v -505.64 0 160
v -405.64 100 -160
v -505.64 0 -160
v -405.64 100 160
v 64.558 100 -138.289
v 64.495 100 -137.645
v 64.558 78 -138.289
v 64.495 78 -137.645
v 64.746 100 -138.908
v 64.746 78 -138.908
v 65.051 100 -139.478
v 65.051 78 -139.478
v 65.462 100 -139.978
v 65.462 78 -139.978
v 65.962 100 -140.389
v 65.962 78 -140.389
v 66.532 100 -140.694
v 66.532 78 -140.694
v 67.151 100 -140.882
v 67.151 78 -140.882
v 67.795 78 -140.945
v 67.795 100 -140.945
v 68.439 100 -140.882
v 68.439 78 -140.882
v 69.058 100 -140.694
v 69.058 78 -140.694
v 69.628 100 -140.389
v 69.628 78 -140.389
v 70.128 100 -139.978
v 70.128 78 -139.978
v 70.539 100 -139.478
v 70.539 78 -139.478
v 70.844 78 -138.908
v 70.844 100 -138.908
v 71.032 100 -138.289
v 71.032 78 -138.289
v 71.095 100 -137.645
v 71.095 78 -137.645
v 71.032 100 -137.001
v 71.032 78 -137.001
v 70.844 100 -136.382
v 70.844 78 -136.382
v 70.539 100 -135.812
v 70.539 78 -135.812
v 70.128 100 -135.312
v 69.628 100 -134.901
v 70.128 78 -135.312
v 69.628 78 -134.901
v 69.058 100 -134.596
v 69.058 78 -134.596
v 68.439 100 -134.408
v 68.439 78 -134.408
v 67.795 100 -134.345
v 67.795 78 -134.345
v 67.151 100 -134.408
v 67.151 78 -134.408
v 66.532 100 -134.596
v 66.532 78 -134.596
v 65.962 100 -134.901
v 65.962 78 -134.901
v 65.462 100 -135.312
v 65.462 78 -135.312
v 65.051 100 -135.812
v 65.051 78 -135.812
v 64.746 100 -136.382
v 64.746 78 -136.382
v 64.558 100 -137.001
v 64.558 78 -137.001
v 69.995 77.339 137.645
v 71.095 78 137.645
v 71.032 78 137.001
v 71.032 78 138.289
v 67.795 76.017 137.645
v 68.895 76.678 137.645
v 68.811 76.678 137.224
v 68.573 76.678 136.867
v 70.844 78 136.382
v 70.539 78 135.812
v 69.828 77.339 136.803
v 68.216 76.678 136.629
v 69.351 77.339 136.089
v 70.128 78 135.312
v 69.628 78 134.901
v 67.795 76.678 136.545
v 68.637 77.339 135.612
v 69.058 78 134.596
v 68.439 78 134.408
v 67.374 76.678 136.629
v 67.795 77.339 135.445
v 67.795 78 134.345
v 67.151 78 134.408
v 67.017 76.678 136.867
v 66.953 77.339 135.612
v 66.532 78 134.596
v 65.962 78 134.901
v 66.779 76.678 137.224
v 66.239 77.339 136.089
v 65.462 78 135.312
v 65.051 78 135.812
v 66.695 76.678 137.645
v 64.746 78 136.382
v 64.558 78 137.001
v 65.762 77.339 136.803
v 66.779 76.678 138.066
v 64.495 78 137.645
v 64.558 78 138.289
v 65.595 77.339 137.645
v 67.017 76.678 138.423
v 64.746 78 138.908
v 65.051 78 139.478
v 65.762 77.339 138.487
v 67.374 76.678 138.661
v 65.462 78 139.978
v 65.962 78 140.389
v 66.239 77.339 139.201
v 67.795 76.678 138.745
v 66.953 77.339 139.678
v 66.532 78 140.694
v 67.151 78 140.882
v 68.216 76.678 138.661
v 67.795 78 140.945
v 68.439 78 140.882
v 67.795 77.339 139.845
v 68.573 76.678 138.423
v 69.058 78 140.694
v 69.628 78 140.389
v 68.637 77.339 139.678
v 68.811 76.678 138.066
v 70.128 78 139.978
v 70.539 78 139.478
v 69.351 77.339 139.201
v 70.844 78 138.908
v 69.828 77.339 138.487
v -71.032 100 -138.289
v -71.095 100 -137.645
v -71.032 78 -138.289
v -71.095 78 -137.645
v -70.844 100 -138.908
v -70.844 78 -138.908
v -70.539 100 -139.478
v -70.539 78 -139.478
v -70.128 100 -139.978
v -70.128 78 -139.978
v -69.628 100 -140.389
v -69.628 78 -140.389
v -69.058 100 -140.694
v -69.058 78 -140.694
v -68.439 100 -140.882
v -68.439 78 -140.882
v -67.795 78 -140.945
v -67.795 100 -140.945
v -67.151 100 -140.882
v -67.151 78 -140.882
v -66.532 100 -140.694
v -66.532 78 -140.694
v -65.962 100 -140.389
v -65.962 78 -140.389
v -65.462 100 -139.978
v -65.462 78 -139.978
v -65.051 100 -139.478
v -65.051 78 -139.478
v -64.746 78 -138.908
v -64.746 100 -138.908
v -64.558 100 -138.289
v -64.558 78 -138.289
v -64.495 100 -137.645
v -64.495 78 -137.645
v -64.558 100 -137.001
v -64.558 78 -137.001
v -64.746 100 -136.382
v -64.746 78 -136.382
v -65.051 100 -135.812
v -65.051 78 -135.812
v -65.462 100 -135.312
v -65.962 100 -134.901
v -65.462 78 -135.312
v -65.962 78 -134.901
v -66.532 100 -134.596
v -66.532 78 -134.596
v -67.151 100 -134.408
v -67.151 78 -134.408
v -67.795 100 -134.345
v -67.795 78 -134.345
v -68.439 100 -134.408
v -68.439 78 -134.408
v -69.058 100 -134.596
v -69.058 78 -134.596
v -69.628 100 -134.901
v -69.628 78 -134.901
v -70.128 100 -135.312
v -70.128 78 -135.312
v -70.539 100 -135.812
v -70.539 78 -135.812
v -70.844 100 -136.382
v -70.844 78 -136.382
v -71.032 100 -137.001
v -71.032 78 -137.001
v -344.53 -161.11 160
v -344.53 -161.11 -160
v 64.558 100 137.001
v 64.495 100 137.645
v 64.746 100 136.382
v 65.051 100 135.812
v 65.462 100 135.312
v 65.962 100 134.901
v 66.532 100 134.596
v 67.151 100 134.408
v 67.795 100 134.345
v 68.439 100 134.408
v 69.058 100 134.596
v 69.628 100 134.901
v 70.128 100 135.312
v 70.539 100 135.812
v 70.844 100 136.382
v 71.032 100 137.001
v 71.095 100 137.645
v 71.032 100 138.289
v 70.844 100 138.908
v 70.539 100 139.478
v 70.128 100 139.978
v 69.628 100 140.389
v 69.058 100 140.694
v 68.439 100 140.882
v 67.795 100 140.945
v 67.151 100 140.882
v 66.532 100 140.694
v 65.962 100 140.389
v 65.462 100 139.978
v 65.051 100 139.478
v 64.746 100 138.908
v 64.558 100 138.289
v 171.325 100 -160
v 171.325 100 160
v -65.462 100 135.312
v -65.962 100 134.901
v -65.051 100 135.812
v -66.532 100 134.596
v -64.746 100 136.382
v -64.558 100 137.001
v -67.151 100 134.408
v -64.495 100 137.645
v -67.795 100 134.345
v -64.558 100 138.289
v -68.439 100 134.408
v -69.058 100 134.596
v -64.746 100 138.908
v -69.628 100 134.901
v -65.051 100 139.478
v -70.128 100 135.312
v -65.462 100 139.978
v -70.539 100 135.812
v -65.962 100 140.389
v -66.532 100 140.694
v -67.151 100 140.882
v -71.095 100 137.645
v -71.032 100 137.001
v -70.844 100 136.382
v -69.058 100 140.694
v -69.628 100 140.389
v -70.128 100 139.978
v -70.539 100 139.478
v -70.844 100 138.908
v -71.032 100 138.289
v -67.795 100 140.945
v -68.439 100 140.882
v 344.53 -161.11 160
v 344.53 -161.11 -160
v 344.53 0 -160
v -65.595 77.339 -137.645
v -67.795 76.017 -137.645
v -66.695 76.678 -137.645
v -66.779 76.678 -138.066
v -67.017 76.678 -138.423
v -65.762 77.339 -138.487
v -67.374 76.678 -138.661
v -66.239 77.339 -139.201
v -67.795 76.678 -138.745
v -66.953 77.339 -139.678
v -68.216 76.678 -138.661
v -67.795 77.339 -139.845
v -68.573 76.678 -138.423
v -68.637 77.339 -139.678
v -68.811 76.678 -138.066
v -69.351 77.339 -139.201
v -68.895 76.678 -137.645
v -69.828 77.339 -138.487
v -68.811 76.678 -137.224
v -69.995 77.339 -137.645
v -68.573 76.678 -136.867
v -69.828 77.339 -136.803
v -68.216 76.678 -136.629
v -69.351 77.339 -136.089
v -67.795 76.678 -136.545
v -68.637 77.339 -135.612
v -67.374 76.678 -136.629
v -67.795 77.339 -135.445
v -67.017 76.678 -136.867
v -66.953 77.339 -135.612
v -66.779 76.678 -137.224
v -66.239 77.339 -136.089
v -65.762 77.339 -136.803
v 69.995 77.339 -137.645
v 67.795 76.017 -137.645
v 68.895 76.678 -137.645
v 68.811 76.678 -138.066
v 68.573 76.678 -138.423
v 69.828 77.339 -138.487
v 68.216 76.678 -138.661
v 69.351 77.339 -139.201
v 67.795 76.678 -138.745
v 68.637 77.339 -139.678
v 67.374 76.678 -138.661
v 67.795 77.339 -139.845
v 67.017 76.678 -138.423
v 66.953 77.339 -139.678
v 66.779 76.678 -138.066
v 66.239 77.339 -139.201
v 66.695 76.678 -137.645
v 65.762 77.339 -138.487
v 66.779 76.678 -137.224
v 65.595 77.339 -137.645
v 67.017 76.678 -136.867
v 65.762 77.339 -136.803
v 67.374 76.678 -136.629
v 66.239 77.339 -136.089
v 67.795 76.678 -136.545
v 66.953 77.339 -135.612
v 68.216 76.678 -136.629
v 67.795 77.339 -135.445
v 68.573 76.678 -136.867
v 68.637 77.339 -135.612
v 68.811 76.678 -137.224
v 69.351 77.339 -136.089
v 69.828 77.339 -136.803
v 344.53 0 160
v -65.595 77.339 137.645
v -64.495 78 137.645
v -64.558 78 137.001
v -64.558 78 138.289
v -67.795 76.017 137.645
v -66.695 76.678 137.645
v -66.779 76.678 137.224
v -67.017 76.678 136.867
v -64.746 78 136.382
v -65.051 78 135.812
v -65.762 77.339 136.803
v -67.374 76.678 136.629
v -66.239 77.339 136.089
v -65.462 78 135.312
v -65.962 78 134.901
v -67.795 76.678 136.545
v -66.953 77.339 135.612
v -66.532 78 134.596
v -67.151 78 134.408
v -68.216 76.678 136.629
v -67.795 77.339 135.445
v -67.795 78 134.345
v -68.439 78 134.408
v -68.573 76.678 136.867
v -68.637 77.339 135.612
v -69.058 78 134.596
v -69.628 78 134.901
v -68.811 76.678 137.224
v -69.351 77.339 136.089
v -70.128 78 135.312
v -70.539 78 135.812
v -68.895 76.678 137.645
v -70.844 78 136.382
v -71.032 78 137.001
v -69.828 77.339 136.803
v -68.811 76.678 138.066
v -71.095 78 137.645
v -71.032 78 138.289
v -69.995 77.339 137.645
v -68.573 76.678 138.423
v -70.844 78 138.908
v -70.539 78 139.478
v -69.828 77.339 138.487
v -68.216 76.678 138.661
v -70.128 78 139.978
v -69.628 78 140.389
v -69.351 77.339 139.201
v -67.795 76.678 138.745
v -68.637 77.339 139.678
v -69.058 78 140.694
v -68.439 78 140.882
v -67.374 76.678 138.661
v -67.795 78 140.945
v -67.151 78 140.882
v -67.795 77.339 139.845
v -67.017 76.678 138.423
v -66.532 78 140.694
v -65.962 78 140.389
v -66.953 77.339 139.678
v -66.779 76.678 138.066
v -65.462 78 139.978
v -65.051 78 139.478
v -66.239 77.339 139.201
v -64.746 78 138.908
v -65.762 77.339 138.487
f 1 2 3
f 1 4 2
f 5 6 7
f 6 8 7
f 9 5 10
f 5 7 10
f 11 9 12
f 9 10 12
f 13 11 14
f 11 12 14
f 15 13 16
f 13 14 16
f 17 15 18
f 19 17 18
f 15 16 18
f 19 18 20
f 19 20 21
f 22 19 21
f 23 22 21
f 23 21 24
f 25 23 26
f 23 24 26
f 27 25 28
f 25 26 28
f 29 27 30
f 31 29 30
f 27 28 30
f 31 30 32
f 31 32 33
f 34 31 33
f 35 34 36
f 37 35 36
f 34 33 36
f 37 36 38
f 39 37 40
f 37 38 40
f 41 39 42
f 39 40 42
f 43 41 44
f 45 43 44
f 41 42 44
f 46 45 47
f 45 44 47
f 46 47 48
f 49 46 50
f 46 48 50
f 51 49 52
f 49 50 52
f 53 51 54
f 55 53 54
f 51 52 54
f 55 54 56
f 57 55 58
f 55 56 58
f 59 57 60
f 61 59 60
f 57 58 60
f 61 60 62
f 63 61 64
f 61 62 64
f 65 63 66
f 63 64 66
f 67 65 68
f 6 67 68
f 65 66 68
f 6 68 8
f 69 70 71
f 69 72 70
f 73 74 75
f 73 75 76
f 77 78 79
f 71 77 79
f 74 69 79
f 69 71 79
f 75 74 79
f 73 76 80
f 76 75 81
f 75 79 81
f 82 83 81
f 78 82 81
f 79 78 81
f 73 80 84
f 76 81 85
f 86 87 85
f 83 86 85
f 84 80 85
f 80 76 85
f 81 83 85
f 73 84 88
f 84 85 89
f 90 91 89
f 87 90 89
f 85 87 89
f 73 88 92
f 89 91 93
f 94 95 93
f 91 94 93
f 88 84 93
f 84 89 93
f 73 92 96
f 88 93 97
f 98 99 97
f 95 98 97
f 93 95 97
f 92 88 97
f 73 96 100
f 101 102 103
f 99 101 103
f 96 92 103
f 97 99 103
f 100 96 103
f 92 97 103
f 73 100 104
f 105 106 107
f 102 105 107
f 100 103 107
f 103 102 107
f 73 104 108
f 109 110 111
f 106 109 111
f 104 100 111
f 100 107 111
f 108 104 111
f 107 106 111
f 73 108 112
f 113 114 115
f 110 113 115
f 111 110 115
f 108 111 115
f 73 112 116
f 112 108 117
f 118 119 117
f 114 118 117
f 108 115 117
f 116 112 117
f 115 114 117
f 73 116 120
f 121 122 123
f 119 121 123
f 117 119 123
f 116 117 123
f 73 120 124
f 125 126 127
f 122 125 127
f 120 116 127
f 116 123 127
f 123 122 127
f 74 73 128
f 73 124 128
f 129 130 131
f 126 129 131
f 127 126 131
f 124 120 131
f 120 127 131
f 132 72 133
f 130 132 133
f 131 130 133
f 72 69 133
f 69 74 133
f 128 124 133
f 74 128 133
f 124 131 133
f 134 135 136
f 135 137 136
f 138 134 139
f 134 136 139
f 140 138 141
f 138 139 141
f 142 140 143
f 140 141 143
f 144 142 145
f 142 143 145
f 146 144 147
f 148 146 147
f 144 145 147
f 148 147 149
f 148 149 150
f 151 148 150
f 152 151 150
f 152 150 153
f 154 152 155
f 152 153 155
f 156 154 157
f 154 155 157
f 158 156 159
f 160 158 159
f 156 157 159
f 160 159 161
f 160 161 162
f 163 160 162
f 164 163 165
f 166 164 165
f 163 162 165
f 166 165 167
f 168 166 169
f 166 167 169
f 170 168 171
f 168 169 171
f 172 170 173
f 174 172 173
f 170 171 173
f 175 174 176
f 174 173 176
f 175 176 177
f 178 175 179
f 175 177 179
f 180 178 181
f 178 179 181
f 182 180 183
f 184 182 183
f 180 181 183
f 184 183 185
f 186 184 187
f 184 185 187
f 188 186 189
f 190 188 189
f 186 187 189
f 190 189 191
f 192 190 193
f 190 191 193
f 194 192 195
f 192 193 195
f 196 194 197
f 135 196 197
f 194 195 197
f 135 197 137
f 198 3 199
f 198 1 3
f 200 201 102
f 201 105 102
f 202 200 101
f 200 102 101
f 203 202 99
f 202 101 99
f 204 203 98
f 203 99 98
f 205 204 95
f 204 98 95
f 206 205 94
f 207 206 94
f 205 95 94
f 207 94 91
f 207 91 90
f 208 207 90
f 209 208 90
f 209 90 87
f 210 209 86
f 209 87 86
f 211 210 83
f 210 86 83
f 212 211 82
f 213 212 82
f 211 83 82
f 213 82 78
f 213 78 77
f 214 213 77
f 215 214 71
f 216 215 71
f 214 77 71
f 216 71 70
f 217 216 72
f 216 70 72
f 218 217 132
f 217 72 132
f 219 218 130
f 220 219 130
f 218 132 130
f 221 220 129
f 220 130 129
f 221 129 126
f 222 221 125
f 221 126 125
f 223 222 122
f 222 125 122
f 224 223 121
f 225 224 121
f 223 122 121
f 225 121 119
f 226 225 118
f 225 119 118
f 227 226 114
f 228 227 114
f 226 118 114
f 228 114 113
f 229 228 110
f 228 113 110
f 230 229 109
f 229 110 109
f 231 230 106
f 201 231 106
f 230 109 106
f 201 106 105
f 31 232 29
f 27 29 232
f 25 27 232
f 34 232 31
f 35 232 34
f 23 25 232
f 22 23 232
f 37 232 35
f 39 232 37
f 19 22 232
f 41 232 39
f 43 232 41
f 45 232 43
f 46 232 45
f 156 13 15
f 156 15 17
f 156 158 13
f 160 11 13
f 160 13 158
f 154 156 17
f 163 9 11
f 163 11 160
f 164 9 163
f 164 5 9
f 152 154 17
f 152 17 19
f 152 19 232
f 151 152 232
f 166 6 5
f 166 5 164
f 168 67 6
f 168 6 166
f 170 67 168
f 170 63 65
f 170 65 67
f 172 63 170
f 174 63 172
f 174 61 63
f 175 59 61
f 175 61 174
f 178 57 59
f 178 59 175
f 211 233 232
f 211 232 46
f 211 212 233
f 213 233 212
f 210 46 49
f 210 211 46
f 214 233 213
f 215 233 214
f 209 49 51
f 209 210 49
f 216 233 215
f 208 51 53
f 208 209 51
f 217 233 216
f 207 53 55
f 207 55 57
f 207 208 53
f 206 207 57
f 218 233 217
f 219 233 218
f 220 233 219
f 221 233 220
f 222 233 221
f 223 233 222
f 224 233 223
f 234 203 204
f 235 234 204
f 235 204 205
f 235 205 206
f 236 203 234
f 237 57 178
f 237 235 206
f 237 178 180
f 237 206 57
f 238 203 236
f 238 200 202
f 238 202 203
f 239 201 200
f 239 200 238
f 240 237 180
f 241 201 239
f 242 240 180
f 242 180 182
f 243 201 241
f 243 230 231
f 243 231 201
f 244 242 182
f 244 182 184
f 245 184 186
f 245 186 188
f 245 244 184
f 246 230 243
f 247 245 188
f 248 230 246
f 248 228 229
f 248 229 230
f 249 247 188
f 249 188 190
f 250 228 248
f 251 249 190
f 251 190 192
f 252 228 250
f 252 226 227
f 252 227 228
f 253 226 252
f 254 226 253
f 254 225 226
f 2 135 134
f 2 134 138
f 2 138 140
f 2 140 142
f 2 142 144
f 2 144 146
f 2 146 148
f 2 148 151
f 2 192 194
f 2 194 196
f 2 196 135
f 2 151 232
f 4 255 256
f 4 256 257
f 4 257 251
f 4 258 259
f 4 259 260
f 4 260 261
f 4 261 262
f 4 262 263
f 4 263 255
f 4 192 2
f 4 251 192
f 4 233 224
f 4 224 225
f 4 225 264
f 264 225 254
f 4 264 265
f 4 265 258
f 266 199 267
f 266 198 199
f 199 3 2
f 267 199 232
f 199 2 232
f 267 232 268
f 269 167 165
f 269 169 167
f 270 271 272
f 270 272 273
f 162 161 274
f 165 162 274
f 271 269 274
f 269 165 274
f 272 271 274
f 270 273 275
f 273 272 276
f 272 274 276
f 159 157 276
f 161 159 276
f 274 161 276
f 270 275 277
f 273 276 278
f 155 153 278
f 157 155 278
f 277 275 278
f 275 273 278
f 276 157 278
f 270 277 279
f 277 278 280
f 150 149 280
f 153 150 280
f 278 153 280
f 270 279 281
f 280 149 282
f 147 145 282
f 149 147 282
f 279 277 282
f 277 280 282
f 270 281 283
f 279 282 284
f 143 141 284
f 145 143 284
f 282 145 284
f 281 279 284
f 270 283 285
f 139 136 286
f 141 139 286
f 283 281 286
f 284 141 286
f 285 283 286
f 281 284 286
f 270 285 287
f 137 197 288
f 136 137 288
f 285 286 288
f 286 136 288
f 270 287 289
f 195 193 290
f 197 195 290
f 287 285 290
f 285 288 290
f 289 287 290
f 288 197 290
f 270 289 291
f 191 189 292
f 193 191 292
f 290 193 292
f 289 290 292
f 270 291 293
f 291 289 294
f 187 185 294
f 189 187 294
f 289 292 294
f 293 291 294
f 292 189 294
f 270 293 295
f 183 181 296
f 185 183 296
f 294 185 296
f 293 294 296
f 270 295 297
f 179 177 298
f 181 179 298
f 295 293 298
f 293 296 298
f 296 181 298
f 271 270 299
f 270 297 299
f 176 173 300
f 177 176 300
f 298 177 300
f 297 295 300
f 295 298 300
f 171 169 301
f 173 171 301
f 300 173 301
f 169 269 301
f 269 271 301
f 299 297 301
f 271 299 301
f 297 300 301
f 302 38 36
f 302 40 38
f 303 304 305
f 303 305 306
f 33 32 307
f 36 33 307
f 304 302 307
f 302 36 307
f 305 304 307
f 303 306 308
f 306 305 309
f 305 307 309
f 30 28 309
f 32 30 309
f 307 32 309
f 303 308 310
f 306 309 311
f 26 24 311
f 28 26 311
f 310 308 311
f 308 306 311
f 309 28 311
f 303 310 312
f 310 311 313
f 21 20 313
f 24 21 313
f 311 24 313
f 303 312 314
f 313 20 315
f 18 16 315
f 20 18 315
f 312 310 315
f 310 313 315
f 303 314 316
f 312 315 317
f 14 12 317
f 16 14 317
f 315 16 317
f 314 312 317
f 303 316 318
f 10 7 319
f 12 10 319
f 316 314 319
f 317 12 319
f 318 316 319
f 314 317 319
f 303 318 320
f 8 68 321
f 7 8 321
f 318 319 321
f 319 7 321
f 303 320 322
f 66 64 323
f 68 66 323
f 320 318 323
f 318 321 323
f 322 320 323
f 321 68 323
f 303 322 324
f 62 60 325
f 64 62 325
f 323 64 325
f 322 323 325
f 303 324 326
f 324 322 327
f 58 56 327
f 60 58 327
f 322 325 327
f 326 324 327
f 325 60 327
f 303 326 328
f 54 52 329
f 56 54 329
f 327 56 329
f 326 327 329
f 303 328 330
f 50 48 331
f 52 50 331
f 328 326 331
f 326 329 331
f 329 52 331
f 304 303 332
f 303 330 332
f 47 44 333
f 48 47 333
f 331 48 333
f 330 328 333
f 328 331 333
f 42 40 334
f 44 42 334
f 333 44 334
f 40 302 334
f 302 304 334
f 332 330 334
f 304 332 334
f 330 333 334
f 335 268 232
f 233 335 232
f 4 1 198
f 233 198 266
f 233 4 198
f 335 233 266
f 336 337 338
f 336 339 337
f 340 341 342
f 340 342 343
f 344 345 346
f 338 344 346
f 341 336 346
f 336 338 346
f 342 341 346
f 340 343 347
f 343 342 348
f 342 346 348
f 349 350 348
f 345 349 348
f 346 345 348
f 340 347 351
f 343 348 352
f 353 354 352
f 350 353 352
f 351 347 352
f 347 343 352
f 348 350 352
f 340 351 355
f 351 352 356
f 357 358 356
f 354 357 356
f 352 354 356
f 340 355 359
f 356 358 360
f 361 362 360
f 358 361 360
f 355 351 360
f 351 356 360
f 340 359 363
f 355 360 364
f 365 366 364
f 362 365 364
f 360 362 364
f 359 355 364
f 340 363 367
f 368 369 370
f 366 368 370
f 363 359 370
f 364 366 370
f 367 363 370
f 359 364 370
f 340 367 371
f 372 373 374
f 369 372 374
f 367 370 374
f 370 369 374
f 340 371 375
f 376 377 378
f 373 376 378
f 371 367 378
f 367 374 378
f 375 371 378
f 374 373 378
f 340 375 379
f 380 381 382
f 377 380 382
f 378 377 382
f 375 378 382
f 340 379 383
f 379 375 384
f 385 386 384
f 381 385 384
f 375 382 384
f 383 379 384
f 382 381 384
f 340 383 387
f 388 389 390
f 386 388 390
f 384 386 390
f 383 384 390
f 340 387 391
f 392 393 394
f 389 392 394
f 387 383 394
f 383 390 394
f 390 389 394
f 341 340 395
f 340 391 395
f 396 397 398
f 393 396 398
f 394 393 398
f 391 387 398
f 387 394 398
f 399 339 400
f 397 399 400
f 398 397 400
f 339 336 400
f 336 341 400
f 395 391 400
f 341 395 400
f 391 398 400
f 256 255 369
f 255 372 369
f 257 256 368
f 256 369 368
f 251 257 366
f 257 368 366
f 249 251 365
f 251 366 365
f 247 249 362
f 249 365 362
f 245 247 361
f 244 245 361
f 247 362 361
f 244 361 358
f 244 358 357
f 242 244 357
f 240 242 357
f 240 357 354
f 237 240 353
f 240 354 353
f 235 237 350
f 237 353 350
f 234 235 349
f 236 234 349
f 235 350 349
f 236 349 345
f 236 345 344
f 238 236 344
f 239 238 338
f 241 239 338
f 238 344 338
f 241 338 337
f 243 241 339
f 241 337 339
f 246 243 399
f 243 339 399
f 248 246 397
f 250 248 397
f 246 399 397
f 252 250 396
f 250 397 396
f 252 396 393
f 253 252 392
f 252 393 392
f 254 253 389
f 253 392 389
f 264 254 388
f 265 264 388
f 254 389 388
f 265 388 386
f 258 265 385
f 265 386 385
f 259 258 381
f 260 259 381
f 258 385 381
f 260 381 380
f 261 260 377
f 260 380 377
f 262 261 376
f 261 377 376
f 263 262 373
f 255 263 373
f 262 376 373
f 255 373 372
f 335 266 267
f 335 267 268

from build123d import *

# Parameters (mm, degrees)
SALIENTE_EXTRUIR2_DEPTH          = 160
TALADRO_DE_MARGEN_PARA_M61_D     = 6.6
TALADRO_DE_MARGEN_PARA_M61_DEPTH = 22
TALADRO_DE_MARGEN_PARA_M61_TIP   = 1.982840043


with BuildPart() as part:
    # Croquis3 → Saliente-Extruir2 (new, symmetric)
    with BuildSketch(Plane.XY):
        Polygon((-344.53, -161.11), (344.53, -161.11), (344.53, 0), (171.324919243, 100), (-405.64, 100), (-505.64, 0), align=None)
    extrude(amount=SALIENTE_EXTRUIR2_DEPTH, both=True)

    # Taladro de margen para M61
    with Locations(Plane(origin=(0, 100, 0), x_dir=(1, 0, 0), z_dir=(0, 1, 0))):
        with Locations((-67.795, 137.645), (67.795, 137.645), (-67.795, -137.645), (67.795, -137.645)):
            Hole(TALADRO_DE_MARGEN_PARA_M61_D / 2, depth=TALADRO_DE_MARGEN_PARA_M61_DEPTH)
            with Locations((0, 0, -(TALADRO_DE_MARGEN_PARA_M61_DEPTH + TALADRO_DE_MARGEN_PARA_M61_TIP / 2))):  # 118° drill point
                Cone(0, TALADRO_DE_MARGEN_PARA_M61_D / 2, TALADRO_DE_MARGEN_PARA_M61_TIP, mode=Mode.SUBTRACT)


solid = part.part
